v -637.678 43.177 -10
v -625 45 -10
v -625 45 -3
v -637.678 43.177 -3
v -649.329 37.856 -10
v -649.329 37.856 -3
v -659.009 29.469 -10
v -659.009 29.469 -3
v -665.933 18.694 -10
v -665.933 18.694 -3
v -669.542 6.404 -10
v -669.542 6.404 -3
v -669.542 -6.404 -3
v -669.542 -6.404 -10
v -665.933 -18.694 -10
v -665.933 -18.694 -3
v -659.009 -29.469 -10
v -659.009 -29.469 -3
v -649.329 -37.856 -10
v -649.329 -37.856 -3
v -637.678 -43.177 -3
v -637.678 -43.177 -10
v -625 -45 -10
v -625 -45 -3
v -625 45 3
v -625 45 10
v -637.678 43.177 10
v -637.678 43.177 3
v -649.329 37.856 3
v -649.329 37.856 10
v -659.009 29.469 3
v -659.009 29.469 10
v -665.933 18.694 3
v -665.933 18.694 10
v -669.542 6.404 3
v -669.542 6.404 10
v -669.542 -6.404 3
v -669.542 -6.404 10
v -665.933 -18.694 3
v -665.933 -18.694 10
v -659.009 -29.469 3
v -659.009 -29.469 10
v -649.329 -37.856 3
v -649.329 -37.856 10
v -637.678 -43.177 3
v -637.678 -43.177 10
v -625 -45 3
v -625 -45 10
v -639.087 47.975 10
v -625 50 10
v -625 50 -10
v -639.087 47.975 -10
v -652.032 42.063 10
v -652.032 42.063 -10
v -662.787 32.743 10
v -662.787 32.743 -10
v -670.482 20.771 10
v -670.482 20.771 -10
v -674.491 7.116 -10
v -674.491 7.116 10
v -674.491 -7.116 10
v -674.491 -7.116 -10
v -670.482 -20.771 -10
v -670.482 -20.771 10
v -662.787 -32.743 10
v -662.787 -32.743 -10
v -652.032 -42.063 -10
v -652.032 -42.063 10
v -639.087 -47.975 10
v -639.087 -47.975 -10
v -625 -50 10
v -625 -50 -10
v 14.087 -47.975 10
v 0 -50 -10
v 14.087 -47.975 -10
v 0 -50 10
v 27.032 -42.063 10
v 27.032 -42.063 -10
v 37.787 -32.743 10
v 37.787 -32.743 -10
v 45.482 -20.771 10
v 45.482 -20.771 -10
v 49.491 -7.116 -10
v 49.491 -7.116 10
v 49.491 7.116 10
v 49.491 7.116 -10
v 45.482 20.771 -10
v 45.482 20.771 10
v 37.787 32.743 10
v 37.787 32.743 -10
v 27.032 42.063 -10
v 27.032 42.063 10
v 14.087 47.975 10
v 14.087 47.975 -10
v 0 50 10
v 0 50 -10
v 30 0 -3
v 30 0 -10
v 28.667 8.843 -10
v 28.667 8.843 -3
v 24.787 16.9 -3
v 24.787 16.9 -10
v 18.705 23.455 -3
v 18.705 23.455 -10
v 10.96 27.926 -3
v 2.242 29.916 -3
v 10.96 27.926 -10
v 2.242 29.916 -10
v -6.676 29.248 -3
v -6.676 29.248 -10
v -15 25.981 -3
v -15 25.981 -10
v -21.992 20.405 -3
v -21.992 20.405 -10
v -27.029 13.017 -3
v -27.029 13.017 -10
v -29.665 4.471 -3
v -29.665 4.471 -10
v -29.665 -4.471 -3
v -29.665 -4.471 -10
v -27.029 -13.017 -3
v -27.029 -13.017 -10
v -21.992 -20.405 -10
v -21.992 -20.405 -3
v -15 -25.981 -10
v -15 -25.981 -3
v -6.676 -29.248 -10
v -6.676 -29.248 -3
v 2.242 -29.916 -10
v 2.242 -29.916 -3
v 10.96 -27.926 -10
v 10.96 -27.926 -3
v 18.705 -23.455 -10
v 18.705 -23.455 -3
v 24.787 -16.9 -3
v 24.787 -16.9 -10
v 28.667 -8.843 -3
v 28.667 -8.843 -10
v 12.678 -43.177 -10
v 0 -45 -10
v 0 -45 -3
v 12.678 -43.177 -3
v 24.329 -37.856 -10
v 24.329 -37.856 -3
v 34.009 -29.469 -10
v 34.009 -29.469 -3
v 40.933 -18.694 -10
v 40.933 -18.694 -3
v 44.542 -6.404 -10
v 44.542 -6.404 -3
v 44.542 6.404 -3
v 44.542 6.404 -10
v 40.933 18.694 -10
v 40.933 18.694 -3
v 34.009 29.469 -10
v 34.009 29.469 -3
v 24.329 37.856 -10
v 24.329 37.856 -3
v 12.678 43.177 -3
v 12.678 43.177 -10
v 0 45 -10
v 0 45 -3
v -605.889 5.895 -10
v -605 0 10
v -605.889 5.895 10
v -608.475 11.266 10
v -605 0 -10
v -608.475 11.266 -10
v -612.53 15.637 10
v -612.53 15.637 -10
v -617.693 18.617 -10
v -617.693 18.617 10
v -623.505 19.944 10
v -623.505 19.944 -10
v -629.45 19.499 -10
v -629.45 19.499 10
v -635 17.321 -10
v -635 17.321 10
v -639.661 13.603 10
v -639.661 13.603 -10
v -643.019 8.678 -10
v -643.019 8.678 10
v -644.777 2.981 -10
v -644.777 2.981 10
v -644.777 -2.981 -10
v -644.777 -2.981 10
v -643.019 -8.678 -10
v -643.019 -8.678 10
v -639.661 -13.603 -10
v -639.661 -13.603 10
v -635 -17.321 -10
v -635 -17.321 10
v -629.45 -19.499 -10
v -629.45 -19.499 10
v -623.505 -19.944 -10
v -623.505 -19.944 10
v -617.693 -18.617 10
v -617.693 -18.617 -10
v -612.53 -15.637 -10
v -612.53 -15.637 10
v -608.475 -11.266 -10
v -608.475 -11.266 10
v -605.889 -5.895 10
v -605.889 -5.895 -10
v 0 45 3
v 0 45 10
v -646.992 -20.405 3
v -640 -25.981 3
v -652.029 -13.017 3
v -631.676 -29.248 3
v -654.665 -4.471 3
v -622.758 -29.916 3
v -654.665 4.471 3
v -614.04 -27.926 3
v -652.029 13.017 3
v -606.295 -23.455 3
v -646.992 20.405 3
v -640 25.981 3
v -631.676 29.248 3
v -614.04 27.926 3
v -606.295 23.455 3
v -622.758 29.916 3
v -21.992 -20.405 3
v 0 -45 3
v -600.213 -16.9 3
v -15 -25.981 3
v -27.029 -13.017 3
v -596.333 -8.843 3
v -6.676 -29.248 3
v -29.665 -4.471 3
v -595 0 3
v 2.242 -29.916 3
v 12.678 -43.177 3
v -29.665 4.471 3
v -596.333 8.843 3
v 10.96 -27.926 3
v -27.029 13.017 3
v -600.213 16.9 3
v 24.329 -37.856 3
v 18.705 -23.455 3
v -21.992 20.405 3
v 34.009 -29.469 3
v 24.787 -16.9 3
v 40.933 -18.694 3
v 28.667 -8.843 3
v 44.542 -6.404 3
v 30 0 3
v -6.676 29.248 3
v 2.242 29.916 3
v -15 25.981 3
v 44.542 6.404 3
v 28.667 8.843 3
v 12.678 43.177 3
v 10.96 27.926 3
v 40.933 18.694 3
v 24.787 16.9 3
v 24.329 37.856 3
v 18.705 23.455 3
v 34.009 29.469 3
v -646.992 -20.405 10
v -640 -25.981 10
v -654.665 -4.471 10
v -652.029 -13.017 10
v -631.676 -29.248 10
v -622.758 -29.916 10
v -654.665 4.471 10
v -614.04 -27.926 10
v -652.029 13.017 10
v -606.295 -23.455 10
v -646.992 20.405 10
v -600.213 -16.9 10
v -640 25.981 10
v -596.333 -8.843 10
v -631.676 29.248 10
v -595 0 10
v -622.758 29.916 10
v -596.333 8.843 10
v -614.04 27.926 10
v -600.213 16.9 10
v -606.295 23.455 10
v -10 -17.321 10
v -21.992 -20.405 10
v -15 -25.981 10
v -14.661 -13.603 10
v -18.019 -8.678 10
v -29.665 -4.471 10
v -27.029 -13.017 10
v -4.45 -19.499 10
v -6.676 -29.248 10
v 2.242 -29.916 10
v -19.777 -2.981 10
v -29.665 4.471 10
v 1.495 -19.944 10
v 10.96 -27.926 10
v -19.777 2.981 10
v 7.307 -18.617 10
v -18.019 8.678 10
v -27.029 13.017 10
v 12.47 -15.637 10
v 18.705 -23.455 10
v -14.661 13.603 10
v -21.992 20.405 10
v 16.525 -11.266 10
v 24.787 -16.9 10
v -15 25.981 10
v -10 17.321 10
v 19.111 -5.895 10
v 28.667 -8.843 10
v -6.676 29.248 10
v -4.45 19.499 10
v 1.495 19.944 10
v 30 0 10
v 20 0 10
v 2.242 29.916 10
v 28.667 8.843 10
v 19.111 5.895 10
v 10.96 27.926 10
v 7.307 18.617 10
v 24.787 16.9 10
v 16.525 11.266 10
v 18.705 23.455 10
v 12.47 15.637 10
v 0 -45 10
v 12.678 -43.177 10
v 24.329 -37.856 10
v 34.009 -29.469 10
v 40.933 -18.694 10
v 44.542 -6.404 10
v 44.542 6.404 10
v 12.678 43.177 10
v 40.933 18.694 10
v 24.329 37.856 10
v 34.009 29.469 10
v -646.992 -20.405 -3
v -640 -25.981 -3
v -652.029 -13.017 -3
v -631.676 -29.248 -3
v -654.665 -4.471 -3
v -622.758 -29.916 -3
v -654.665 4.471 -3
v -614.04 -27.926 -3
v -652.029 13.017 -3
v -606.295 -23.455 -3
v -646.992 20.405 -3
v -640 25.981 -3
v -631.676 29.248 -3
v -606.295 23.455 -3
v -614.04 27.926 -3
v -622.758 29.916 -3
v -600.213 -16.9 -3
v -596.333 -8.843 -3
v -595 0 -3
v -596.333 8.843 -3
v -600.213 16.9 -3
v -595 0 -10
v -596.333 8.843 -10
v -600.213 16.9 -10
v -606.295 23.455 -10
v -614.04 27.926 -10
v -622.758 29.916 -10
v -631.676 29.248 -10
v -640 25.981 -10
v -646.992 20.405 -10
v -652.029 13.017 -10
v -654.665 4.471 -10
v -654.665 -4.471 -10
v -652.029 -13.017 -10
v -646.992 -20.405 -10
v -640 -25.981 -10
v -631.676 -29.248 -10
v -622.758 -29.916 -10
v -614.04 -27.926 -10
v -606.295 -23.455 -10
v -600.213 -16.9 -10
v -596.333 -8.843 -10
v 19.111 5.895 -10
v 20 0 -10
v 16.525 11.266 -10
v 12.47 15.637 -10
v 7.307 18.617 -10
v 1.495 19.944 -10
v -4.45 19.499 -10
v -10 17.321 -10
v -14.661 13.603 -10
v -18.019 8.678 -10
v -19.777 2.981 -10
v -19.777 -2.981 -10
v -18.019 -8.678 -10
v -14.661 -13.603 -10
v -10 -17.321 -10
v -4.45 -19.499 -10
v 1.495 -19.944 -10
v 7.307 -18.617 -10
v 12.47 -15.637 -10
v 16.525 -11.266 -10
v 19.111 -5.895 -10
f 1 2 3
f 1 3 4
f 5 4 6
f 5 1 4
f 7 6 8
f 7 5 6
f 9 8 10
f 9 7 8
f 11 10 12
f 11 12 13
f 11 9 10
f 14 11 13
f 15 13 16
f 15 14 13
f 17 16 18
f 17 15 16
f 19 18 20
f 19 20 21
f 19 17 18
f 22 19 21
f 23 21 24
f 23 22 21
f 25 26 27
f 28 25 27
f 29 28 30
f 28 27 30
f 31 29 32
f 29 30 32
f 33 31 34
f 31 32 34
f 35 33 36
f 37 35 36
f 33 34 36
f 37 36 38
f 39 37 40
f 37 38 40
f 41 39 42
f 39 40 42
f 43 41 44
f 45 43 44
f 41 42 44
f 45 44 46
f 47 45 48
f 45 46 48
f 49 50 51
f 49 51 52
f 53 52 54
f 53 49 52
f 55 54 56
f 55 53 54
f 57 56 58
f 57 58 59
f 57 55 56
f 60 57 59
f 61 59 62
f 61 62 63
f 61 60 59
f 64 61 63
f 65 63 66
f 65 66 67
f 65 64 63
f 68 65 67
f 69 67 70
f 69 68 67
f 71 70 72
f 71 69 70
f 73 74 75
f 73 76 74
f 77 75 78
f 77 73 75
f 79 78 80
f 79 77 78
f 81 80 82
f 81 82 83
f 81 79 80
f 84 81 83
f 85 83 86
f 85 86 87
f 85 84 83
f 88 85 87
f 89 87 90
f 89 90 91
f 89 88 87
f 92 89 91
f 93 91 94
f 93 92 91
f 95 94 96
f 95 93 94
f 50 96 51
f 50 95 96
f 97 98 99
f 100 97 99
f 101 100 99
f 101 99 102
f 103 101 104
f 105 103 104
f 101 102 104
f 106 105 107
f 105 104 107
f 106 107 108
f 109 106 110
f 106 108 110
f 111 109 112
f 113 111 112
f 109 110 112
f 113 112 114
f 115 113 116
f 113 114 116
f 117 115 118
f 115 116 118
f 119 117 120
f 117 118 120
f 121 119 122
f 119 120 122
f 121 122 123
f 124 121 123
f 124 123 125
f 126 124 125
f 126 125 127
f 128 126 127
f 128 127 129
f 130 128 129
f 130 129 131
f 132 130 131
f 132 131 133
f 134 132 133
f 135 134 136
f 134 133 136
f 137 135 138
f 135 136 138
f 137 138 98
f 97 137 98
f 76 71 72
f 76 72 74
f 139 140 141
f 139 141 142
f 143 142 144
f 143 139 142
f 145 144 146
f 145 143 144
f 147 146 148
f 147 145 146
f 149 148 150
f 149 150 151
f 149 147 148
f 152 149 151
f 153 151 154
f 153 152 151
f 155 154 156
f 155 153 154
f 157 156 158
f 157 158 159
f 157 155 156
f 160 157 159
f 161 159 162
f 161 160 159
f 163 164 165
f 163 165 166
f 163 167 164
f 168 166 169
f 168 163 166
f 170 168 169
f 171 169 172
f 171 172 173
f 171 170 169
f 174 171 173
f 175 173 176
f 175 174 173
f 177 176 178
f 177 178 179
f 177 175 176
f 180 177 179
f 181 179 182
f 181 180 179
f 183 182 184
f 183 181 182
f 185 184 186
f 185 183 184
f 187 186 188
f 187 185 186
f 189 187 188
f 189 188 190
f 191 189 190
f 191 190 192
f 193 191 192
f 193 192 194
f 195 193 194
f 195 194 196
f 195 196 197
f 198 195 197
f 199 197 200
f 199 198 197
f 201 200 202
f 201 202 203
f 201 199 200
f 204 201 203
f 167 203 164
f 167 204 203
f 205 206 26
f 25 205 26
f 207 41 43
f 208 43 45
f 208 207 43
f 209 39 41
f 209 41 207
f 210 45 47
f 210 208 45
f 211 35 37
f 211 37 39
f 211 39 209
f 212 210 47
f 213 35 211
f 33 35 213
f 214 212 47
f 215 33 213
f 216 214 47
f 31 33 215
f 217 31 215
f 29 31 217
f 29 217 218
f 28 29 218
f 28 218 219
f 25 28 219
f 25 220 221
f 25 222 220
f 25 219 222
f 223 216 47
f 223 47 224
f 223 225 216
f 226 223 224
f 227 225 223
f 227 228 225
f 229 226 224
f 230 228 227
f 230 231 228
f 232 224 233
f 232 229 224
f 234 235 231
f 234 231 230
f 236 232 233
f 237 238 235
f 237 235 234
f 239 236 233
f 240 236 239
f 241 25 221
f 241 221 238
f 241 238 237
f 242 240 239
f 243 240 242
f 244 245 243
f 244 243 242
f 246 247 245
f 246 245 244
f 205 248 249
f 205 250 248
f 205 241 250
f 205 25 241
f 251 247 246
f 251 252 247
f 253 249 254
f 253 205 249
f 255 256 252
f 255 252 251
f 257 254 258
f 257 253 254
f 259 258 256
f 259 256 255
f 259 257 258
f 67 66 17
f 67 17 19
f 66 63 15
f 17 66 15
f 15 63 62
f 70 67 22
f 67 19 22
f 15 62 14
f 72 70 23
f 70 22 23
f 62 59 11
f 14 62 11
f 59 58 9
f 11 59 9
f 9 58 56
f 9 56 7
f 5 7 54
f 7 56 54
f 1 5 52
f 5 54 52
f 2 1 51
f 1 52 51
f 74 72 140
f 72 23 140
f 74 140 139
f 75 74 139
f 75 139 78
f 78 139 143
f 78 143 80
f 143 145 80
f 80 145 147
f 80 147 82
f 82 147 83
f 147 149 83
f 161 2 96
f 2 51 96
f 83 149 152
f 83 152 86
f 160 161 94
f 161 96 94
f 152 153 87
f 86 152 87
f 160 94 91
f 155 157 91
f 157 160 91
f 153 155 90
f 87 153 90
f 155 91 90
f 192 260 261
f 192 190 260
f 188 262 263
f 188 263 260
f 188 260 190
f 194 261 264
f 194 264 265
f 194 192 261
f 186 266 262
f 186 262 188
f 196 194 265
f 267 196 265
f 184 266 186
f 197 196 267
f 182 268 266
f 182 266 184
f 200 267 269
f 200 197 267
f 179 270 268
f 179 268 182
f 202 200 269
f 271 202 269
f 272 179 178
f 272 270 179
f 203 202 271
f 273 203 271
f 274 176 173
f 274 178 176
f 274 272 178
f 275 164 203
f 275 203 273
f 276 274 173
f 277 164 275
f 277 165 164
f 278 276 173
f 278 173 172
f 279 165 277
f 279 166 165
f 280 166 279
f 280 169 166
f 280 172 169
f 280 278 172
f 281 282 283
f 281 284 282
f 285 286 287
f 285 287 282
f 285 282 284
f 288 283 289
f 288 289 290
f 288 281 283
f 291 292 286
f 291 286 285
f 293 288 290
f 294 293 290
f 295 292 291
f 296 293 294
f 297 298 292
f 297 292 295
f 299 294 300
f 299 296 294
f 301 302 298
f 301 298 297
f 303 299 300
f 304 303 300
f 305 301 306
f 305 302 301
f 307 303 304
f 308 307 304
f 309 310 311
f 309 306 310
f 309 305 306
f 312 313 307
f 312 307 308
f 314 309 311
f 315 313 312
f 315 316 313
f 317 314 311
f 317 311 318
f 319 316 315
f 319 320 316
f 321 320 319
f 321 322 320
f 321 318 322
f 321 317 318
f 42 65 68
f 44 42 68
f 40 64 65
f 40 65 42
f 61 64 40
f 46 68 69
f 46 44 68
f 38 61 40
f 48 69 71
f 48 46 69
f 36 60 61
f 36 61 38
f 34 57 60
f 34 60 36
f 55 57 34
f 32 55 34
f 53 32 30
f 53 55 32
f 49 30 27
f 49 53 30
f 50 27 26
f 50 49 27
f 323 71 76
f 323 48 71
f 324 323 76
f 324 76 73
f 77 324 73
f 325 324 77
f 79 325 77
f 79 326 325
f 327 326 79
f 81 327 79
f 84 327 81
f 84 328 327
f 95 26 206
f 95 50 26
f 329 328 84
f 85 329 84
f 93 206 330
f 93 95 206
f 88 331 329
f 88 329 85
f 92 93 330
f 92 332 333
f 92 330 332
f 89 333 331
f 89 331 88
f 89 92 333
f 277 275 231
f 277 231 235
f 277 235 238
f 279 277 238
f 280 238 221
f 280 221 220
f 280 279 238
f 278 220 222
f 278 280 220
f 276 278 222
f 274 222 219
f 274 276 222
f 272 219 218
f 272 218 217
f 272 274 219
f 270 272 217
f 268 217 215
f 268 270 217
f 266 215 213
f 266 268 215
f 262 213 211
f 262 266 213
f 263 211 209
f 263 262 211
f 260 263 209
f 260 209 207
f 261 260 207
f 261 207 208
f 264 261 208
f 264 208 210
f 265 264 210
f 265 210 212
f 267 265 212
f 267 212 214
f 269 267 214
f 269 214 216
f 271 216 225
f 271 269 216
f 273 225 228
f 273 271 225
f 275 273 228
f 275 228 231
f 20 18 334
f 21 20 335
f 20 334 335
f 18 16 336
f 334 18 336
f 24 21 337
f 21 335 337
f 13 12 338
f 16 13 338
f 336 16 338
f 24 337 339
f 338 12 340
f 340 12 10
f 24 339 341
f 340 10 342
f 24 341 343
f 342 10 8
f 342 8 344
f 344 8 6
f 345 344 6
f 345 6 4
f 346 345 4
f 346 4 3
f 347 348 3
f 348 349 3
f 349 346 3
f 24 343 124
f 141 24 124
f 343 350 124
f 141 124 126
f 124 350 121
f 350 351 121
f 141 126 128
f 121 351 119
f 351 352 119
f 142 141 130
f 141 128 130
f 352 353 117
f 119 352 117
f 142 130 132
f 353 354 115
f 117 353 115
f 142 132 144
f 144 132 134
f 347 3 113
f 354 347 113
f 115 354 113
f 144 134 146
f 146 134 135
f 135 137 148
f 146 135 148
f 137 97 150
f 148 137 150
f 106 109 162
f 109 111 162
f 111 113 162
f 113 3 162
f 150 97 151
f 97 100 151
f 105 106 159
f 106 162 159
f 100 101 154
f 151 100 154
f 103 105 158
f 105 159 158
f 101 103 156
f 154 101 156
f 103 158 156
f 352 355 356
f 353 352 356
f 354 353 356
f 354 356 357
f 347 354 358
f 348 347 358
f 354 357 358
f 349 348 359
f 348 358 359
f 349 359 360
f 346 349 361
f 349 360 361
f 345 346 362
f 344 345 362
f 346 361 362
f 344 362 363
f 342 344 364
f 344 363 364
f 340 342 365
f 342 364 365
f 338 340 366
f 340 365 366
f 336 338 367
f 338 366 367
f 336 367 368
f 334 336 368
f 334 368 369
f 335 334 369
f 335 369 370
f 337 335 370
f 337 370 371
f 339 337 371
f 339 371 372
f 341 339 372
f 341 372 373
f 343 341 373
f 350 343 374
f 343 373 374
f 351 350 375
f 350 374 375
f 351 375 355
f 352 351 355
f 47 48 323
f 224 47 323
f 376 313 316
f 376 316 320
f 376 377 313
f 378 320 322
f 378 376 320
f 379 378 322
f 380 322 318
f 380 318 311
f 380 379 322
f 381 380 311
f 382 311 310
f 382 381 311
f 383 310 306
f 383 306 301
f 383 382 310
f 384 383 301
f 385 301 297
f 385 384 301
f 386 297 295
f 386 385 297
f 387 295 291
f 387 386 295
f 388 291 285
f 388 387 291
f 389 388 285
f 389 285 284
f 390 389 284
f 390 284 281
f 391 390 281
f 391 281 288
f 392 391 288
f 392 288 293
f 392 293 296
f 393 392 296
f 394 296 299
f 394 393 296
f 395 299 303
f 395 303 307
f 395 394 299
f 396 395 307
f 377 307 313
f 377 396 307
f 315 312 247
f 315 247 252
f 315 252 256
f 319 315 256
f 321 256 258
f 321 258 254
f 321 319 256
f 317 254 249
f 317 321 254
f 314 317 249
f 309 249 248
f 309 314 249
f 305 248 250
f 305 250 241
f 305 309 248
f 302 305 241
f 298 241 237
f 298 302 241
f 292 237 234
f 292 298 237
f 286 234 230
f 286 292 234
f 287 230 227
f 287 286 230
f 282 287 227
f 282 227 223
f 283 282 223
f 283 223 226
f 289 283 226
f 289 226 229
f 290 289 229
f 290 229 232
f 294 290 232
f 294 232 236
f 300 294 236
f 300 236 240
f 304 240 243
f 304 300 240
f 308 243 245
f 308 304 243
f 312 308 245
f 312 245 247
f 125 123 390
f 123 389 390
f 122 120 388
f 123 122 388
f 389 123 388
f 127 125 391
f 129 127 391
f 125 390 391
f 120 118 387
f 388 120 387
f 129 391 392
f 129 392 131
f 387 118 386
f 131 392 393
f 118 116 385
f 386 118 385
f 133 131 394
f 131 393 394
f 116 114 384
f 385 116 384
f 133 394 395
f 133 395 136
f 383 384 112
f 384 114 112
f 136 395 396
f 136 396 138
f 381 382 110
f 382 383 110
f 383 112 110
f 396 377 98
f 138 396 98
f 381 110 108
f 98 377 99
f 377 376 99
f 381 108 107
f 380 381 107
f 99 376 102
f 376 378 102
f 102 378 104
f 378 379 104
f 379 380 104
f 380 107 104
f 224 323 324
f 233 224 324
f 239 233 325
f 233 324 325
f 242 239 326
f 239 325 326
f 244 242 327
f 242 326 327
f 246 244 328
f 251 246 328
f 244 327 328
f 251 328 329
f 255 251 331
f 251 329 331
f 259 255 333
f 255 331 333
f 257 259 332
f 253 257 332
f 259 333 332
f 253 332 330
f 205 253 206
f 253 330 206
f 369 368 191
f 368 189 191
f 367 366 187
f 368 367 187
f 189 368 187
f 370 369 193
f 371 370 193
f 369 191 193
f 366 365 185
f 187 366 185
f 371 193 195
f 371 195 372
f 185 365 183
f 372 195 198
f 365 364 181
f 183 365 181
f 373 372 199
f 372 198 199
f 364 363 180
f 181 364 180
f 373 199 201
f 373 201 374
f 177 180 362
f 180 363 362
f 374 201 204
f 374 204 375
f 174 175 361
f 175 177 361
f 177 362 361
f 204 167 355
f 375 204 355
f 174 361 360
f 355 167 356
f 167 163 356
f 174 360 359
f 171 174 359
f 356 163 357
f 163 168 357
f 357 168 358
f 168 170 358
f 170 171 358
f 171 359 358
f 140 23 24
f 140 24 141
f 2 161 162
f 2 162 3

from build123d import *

# Parameters (mm, degrees)
SKETCH1_R          = 20
EXTRUDE1_DEPTH     = 10
SKETCH2_R          = 30
CUT_EXTRUDE1_DEPTH = 7


with BuildPart() as part:
    # Sketch1 → Extrude1 (new, symmetric)
    with BuildSketch(Plane.XY):
        with BuildLine():
            Line((0, 50), (-625, 50))
            ThreePointArc((-625, 50), (-675, 0), (-625, -50))
            Line((-625, -50), (0, -50))
            ThreePointArc((0, -50), (50, 0), (0, 50))
        make_face()
        Circle(SKETCH1_R, mode=Mode.SUBTRACT)
        with Locations((-625, 0)):
            Circle(SKETCH1_R, mode=Mode.SUBTRACT)
    extrude(amount=EXTRUDE1_DEPTH, both=True)

    # Sketch2 → Cut-Extrude1 (cut)
    with BuildSketch(Plane.XY.offset(10)):
        with BuildLine():
            Line((0, 45), (-625, 45))
            ThreePointArc((-625, 45), (-670, 0), (-625, -45))
            Line((-625, -45), (0, -45))
            ThreePointArc((0, -45), (45, 0), (0, 45))
        make_face()
        Circle(SKETCH2_R, mode=Mode.SUBTRACT)
        with Locations((-625, 0)):
            Circle(SKETCH2_R, mode=Mode.SUBTRACT)
    cut_extrude1 = extrude(amount=-CUT_EXTRUDE1_DEPTH, mode=Mode.SUBTRACT)

    # Mirror1: Cut-Extrude1 across plane
    add(cut_extrude1.mirror(Plane.XY), mode=Mode.SUBTRACT)


solid = part.part
